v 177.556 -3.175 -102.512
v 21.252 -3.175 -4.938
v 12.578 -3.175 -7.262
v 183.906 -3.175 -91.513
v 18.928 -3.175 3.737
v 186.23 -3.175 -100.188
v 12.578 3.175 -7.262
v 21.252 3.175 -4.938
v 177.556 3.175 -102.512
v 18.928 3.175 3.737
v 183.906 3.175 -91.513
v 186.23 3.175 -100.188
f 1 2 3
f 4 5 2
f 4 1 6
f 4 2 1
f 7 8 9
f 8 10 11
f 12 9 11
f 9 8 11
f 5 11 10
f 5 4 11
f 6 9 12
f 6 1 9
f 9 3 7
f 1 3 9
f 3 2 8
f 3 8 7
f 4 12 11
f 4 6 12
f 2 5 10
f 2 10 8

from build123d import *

# Parameters (mm, degrees)
F1_DEPTH = 3.175


with BuildPart() as f1:
    # F0 (on Front) → F1 (new body, symmetric)
    with BuildSketch(Plane.XZ):
        Polygon((21.252101, -4.937558), (180.730679, -97.012558), (183.905679, -91.513296), (18.927839, 3.736704), align=None)
        Polygon((12.577839, -7.261819), (177.555679, -102.511819), (180.730679, -97.012558), (21.252101, -4.937558), align=None)
        Polygon((180.730679, -97.012558), (186.22994, -100.187558), (183.905679, -91.513296), align=None)
        Polygon((180.730679, -97.012558), (177.555679, -102.511819), (186.22994, -100.187558), align=None)
    extrude(amount=F1_DEPTH, both=True)


solid = f1.part
